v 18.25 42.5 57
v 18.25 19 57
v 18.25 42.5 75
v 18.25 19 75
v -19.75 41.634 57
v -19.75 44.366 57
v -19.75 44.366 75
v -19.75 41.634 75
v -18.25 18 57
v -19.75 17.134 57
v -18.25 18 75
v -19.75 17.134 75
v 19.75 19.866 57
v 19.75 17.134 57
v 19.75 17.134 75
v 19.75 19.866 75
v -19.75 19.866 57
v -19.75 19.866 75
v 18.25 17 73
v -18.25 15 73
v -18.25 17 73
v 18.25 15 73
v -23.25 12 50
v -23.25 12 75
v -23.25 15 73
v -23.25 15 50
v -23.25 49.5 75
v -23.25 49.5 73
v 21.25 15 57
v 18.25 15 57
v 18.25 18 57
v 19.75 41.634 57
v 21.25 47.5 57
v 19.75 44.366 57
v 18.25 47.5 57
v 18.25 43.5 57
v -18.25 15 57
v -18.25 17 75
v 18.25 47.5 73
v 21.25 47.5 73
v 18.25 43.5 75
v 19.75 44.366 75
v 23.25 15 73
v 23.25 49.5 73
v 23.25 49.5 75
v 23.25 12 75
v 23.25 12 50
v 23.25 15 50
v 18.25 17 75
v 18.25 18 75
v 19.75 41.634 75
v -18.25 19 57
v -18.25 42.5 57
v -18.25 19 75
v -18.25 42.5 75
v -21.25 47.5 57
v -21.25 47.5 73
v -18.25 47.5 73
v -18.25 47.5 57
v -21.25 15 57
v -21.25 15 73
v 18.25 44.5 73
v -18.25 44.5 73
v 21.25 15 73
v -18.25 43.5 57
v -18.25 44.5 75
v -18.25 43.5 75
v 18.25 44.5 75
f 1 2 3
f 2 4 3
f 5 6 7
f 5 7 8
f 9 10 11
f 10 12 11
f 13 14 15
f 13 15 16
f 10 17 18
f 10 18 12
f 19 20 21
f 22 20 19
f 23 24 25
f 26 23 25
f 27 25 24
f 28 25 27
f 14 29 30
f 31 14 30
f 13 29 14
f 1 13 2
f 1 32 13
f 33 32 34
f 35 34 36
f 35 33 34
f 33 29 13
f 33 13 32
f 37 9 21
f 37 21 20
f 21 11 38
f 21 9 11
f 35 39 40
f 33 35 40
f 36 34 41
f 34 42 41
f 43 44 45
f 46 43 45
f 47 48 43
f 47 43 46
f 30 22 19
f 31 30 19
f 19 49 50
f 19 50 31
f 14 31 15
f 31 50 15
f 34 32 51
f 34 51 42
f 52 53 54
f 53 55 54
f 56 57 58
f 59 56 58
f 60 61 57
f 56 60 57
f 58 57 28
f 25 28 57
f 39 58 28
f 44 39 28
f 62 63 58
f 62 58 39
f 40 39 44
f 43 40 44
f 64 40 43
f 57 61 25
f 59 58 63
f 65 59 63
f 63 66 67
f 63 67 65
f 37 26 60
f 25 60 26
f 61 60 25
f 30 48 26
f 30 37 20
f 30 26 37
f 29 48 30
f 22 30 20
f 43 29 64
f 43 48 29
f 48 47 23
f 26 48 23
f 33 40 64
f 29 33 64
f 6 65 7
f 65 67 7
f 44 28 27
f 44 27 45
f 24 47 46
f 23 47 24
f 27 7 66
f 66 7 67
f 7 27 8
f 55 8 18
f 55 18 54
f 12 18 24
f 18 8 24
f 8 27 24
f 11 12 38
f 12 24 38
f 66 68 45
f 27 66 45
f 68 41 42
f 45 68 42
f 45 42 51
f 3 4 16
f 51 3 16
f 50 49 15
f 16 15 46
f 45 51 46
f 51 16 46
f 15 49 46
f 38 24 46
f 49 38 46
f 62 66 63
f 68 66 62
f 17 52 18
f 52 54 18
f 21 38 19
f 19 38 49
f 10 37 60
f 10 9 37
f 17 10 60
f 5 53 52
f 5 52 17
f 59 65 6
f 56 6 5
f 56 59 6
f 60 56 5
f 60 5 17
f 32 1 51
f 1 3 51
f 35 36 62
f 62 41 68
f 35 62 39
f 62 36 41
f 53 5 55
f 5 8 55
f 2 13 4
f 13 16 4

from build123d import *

# Parameters (mm, degrees)
SKETCH2_W                = 200
SKETCH2_H                = 150
BOSS_EXTRUDE1_DEPTH      = 80
FILLET1_R                = 10
SHELL1_T                 = -2
SHELL1_THICKNESS_2_DEPTH = 13
SKETCH5_W                = 36.5
SKETCH5_H                = 27.5
CUT_EXTRUDE1_DEPTH       = 2
BOSS_EXTRUDE2_DEPTH      = 16
SKETCH7_W                = 36.5
SKETCH7_H                = 27.5
CUT_EXTRUDE2_DEPTH       = 2
BOSS_EXTRUDE3_DEPTH      = 16
SKETCH10_W               = 36.5
SKETCH10_H               = 27.5
CUT_EXTRUDE4_DEPTH       = 2
BOSS_EXTRUDE4_DEPTH      = 16
SKETCH13_W               = 38
SKETCH13_H               = 19.1
CUT_EXTRUDE5_DEPTH       = 2
BOSS_EXTRUDE5_DEPTH      = 13.5
SKETCH15_W               = 10.5
SKETCH15_H               = 9.367949192
CUT_EXTRUDE6_DEPTH       = 3
CUT_EXTRUDE8_REACH       = 150.408
SKETCH20_R               = 8
SPLIT1_SURFACE_1_BACK    = 263.488
SPLIT1_SURFACE_1_DEPTH   = 526.976
SPLIT1_SURFACE_2_BACK    = 263.488
SPLIT1_SURFACE_2_DEPTH   = 526.976
SPLIT2_SURFACE_3_BACK    = 263.488
SPLIT2_SURFACE_3_DEPTH   = 526.976
SPLIT2_SURFACE_4_BACK    = 263.488
SPLIT2_SURFACE_4_DEPTH   = 526.976


with BuildPart() as part:
    # Sketch2 → Boss-Extrude1 (new body)
    with BuildSketch(Plane(origin=(0, 0, 0), x_dir=(1, 0, 0), z_dir=(0, 1, 0))):
        Rectangle(SKETCH2_W, SKETCH2_H)
    extrude(amount=BOSS_EXTRUDE1_DEPTH)

    # Fillet1
    fillet1_edges = [part.edges().sort_by_distance(p)[0] for p in [
        (100, 40, 75),
        (-100, 40, 75),
        (-100, 40, -75),
        (100, 40, -75),
    ]]
    fillet(fillet1_edges, radius=FILLET1_R)

    # Shell1
    shell1_openings = [part.faces().sort_by_distance(p)[0] for p in [
        (0, 80, 0),
    ]]
    offset(amount=SHELL1_T, openings=shell1_openings, kind=Kind.INTERSECTION)

    # Shell1 thickness 2 face (on inner face of the shell) → Shell1 thickness 2 (add)
    with BuildSketch(Plane(origin=(0, 2, 0), x_dir=(0, 0, -1), z_dir=(0, -1, 0))):
        with BuildLine():
            ThreePointArc((73, -90), (70.656854249, -95.656854249), (65, -98))
            Line((65, -98), (-65, -98))
            ThreePointArc((-65, -98), (-70.656854249, -95.656854249), (-73, -90))
            Line((-73, -90), (-73, 90))
            ThreePointArc((-73, 90), (-70.656854249, 95.656854249), (-65, 98))
            Line((-65, 98), (65, 98))
            ThreePointArc((65, 98), (70.656854249, 95.656854249), (73, 90))
            Line((73, 90), (73, -90))
        make_face()
    extrude(amount=-SHELL1_THICKNESS_2_DEPTH)

    # Sketch5 → Cut-Extrude1 (cut)
    with BuildSketch(Plane.XY.offset(75)):
        with Locations((0, 30.75)):
            Rectangle(SKETCH5_W, SKETCH5_H)
        Polygon((-18.25, 43.5), (-19.75, 44.366025404), (-19.75, 41.633974596), (-18.25, 42.5), align=None)
        Polygon((-19.75, 19.866025404), (-18.25, 19), (-18.25, 18), (-19.75, 17.133974596), align=None)
        Polygon((19.75, 17.133974596), (19.75, 19.866025404), (18.25, 19), (18.25, 18), align=None)
        Polygon((19.75, 41.633974596), (18.25, 42.5), (18.25, 43.5), (19.75, 44.366025404), align=None)
    extrude(amount=-CUT_EXTRUDE1_DEPTH, mode=Mode.SUBTRACT)

    # Sketch6 → Boss-Extrude2 (add)
    with BuildSketch(Plane(origin=(0, 0, 73), x_dir=(-1, 0, 0), z_dir=(0, 0, -1))):
        Polygon((18.25, 15), (21.25, 15), (21.25, 47.5), (18.25, 47.5), (18.25, 43.5), (19.75, 44.366025404), (19.75, 41.633974596), (18.25, 42.5), (18.25, 19), (19.75, 19.866025404), (19.75, 17.133974596), (18.25, 18), align=None)
        Polygon((-21.25, 47.5), (-21.25, 15), (-18.25, 15), (-18.25, 18), (-19.75, 17.133974596), (-19.75, 19.866025404), (-18.25, 19), (-18.25, 42.5), (-19.75, 41.633974596), (-19.75, 44.366025404), (-18.25, 43.5), (-18.25, 47.5), align=None)
    extrude(amount=BOSS_EXTRUDE2_DEPTH)

    # Sketch7 → Cut-Extrude2 (cut)
    with BuildSketch(Plane(origin=(100, 0, 0), x_dir=(0, 0, -1), z_dir=(1, 0, 0))):
        with Locations((0, 30.75)):
            Rectangle(SKETCH7_W, SKETCH7_H)
        Polygon((-18.25, 43.5), (-19.75, 44.366025404), (-19.75, 41.633974596), (-18.25, 42.5), align=None)
        Polygon((-19.75, 19.866025404), (-18.25, 19), (-18.25, 18), (-19.75, 17.133974596), align=None)
        Polygon((19.75, 17.133974596), (19.75, 19.866025404), (18.25, 19), (18.25, 18), align=None)
        Polygon((19.75, 41.633974596), (18.25, 42.5), (18.25, 43.5), (19.75, 44.366025404), align=None)
    extrude(amount=-CUT_EXTRUDE2_DEPTH, mode=Mode.SUBTRACT)

    # Sketch8 → Boss-Extrude3 (add)
    with BuildSketch(Plane.ZY.offset(-98)):
        Polygon((-21.25, 47.5), (-18.25, 47.5), (-18.25, 43.5), (-19.75, 44.366025404), (-19.75, 41.633974596), (-18.25, 42.5), (-18.25, 19), (-19.75, 19.866025404), (-19.75, 17.133974596), (-18.25, 18), (-18.25, 15), (-21.25, 15), align=None)
        Polygon((19.75, 44.366025404), (18.25, 43.5), (18.25, 47.5), (21.25, 47.5), (21.25, 15), (18.25, 15), (18.25, 18), (19.75, 17.133974596), (19.75, 19.866025404), (18.25, 19), (18.25, 42.5), (19.75, 41.633974596), align=None)
    extrude(amount=BOSS_EXTRUDE3_DEPTH)

    # Sketch10 → Cut-Extrude4 (cut)
    with BuildSketch(Plane.ZY.offset(100)):
        with Locations((0, 30.75)):
            Rectangle(SKETCH10_W, SKETCH10_H)
        Polygon((-18.25, 43.5), (-19.75, 44.366025404), (-19.75, 41.633974596), (-18.25, 42.5), align=None)
        Polygon((-19.75, 19.866025404), (-18.25, 19), (-18.25, 18), (-19.75, 17.133974596), align=None)
        Polygon((19.75, 17.133974596), (19.75, 19.866025404), (18.25, 19), (18.25, 18), align=None)
        Polygon((19.75, 41.633974596), (18.25, 42.5), (18.25, 43.5), (19.75, 44.366025404), align=None)
    extrude(amount=-CUT_EXTRUDE4_DEPTH, mode=Mode.SUBTRACT)

    # Sketch11 → Boss-Extrude4 (add)
    with BuildSketch(Plane(origin=(-98, 0, 0), x_dir=(0, 0, -1), z_dir=(1, 0, 0))):
        Polygon((-18.25, 47.5), (-21.25, 47.5), (-21.25, 15), (-18.25, 15), (-18.25, 18), (-19.75, 17.133974596), (-19.75, 19.866025404), (-18.25, 19), (-18.25, 42.5), (-19.75, 41.633974596), (-19.75, 44.366025404), (-18.25, 43.5), align=None)
        Polygon((19.75, 44.366025404), (18.25, 43.5), (18.25, 47.5), (21.25, 47.5), (21.25, 15), (18.25, 15), (18.25, 18), (19.75, 17.133974596), (19.75, 19.866025404), (18.25, 19), (18.25, 42.5), (19.75, 41.633974596), align=None)
    extrude(amount=BOSS_EXTRUDE4_DEPTH)

    # Sketch13 → Cut-Extrude5 (cut)
    with BuildSketch(Plane.XY.offset(75)):
        Polygon((41, 39.3), (39.5, 40.166025404), (39.5, 37.433974596), (41, 38.3), align=None)
        with Locations((60, 30.75)):
            Rectangle(SKETCH13_W, SKETCH13_H)
        Polygon((41, 22.2), (39.5, 21.333974596), (39.5, 24.066025404), (41, 23.2), align=None)
        Polygon((79, 22.2), (79, 23.2), (80.5, 24.066025404), (80.5, 21.333974596), align=None)
        Polygon((79, 39.3), (80.5, 40.166025404), (80.5, 37.433974596), (79, 38.3), align=None)
    extrude(amount=-CUT_EXTRUDE5_DEPTH, mode=Mode.SUBTRACT)

    # Sketch14 → Boss-Extrude5 (add)
    with BuildSketch(Plane(origin=(0, 0, 73), x_dir=(-1, 0, 0), z_dir=(0, 0, -1))):
        Polygon((-79, 43.3), (-82, 43.3), (-82, 15), (-79, 15), (-79, 22.2), (-80.5, 21.333974596), (-80.5, 24.066025404), (-79, 23.2), (-79, 38.3), (-80.5, 37.433974596), (-80.5, 40.166025404), (-79, 39.3), align=None)
        Polygon((-39.5, 40.166025404), (-41, 39.3), (-41, 43.3), (-38, 43.3), (-38, 15), (-41, 15), (-41, 22.2), (-39.5, 21.333974596), (-39.5, 24.066025404), (-41, 23.2), (-41, 38.3), (-39.5, 37.433974596), align=None)
    extrude(amount=BOSS_EXTRUDE5_DEPTH)

    # Sketch15 → Cut-Extrude6 (cut)
    with BuildSketch(Plane.ZY.offset(-38)):
        with Locations((66.75, 30.75)):
            Rectangle(SKETCH15_W, SKETCH15_H)
    extrude(amount=-CUT_EXTRUDE6_DEPTH, mode=Mode.SUBTRACT)

    # Sketch18 → Cut-Revolve1 (revolve, cut)
    with BuildSketch(Plane(origin=(0, 0, 0), x_dir=(0, 0, -1), z_dir=(1, 0, 0)), mode=Mode.PRIVATE) as cut_revolve1_sk:
        Polygon((-42.5, 0), (-70, 0), (-47.5, 10), (-42.5, 10), align=None)
    revolve(cut_revolve1_sk.sketch.rotate(Axis((0, 0, 0), (0, 1, 0)), 180), axis=Axis((0, 0, 0), (0, 1, 0)), mode=Mode.SUBTRACT)

    # Cut-Extrude8: up to this face of the body (flat: up to its plane)
    cut_extrude8_end = Plane(part.part.faces().sort_by_distance((-0.172388952, 15, -0.411685035))[0])
    # Sketch20 → Cut-Extrude8 (cut, up to the picked face)
    with BuildSketch(Plane.XZ, mode=Mode.PRIVATE) as cut_extrude8_sk1:
        with Locations(Location((0, -42.5, 0), (0, 0, 270))):
            Circle(SKETCH20_R)
    cut_extrude8_tool1 = split(extrude(cut_extrude8_sk1.sketch, amount=-CUT_EXTRUDE8_REACH, mode=Mode.PRIVATE), bisect_by=cut_extrude8_end, keep=Keep.BOTH, mode=Mode.PRIVATE)
    add(cut_extrude8_tool1.solids().sort_by(Axis((0, 0, -42.5), (0, 1, 0)))[0], mode=Mode.SUBTRACT)


with BuildPart() as body_2:
    # Split1: the piece behind the surface
    add(part.part)
    # Split1 surface: a surface, the sketch's curves swept straight by 526.976 mm
    with BuildLine(Plane.XY.offset(75).offset(-SPLIT1_SURFACE_1_BACK), mode=Mode.PRIVATE) as split1_surface_1_path:
        Line((-23.25, 49.5), (23.25, 49.5))
        Line((23.25, 49.5), (23.25, 12))
        Line((23.25, 12), (-23.25, 12))
        Line((-23.25, 12), (-23.25, 49.5))
    split1_surface_1 = Shell.extrude(split1_surface_1_path.wire(), (0 * SPLIT1_SURFACE_1_DEPTH, 0 * SPLIT1_SURFACE_1_DEPTH, 1 * SPLIT1_SURFACE_1_DEPTH))
    split(bisect_by=split1_surface_1, keep=Keep.BOTTOM)


with BuildPart() as part_1:
    add(part.part)

    # Split1: split by a surface, the side it looks to stays
    # Split1 surface: a surface, the sketch's curves swept straight by 526.976 mm
    with BuildLine(Plane.XY.offset(75).offset(-SPLIT1_SURFACE_2_BACK), mode=Mode.PRIVATE) as split1_surface_2_path:
        Line((-23.25, 49.5), (23.25, 49.5))
        Line((23.25, 49.5), (23.25, 12))
        Line((23.25, 12), (-23.25, 12))
        Line((-23.25, 12), (-23.25, 49.5))
    split1_surface_2 = Shell.extrude(split1_surface_2_path.wire(), (0 * SPLIT1_SURFACE_2_DEPTH, 0 * SPLIT1_SURFACE_2_DEPTH, 1 * SPLIT1_SURFACE_2_DEPTH))
    split(bisect_by=split1_surface_2, keep=Keep.TOP)


with BuildPart() as body_3:
    # Split2: the piece behind the surface
    add(body_2.part)
    # Split2 surface: a surface, the sketch's curves swept straight by 526.976 mm
    with BuildLine(Plane(origin=(0, 15, 0), x_dir=(1, 0, 0), z_dir=(0, 1, 0)).offset(-SPLIT2_SURFACE_3_BACK), mode=Mode.PRIVATE) as split2_surface_3_path:
        Line((-23.25, -75), (23.25, -75))
        Line((23.25, -75), (23.25, -50))
        Line((23.25, -50), (-23.25, -50))
        Line((-23.25, -50), (-23.25, -75))
    split2_surface_3 = Shell.extrude(split2_surface_3_path.wire(), (0 * SPLIT2_SURFACE_3_DEPTH, 1 * SPLIT2_SURFACE_3_DEPTH, 0 * SPLIT2_SURFACE_3_DEPTH))
    split(bisect_by=split2_surface_3, keep=Keep.BOTTOM)


with BuildPart() as body_2_1:
    add(body_2.part)

    # Split2: split by a surface, the side it looks to stays
    # Split2 surface: a surface, the sketch's curves swept straight by 526.976 mm
    with BuildLine(Plane(origin=(0, 15, 0), x_dir=(1, 0, 0), z_dir=(0, 1, 0)).offset(-SPLIT2_SURFACE_4_BACK), mode=Mode.PRIVATE) as split2_surface_4_path:
        Line((-23.25, -75), (23.25, -75))
        Line((23.25, -75), (23.25, -50))
        Line((23.25, -50), (-23.25, -50))
        Line((-23.25, -50), (-23.25, -75))
    split2_surface_4 = Shell.extrude(split2_surface_4_path.wire(), (0 * SPLIT2_SURFACE_4_DEPTH, 1 * SPLIT2_SURFACE_4_DEPTH, 0 * SPLIT2_SURFACE_4_DEPTH))
    split(bisect_by=split2_surface_4, keep=Keep.TOP)


solid = body_2_1.part
